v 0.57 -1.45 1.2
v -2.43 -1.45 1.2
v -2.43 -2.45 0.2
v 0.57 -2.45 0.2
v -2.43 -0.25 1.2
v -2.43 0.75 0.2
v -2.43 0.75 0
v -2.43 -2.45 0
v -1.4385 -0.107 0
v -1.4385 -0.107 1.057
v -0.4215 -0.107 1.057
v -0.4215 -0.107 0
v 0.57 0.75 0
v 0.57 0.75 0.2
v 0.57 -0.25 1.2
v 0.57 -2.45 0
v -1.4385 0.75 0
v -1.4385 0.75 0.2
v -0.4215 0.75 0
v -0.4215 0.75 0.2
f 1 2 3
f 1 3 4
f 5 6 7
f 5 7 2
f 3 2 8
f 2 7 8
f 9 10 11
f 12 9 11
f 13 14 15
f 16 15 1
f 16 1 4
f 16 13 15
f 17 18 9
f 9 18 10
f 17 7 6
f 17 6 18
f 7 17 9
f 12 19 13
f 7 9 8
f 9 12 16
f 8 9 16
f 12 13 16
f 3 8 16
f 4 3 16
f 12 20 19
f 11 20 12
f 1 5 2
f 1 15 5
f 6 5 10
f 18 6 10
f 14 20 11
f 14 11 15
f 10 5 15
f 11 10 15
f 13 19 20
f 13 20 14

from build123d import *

# Parameters (mm, degrees)
SKETCH024_W             = 3.2
SKETCH024_H             = 3
PAD023_DEPTH            = 1.2
CHAMFER009_SIZE         = 1
SKETCH025_W             = 2.017963
SKETCH025_H             = 1.017
POCKET001_DEPTH         = 5
BODY023_PLACEMENT_ANGLE = 90


with BuildPart() as part:
    # Sketch024 → Pad023 (new body)
    with BuildSketch(Plane.XY):
        Rectangle(SKETCH024_W, SKETCH024_H)
    extrude(amount=PAD023_DEPTH)

    # Chamfer009
    chamfer009_edges = [part.edges().sort_by_distance(p)[0] for p in [
        (-1.6, 0, 1.2),
        (1.6, 0, 1.2),
    ]]
    chamfer(chamfer009_edges, length=CHAMFER009_SIZE)

    # Sketch025 (on Face5 of Chamfer009) → Pocket001 (cut)
    with BuildSketch(Plane.XY.offset(1.2)):
        with Locations((-1.75199, 0)):
            Rectangle(SKETCH025_W, SKETCH025_H)
    extrude(amount=-POCKET001_DEPTH, mode=Mode.SUBTRACT)


with BuildPart() as part_1:
    # Body023 placement: moved
    add(part.part.moved(Location((-0.93, -0.85, 0))).rotate(Axis((-0.93, -0.85, 0), (0, 0, -1)), BODY023_PLACEMENT_ANGLE))


solid = part_1.part
